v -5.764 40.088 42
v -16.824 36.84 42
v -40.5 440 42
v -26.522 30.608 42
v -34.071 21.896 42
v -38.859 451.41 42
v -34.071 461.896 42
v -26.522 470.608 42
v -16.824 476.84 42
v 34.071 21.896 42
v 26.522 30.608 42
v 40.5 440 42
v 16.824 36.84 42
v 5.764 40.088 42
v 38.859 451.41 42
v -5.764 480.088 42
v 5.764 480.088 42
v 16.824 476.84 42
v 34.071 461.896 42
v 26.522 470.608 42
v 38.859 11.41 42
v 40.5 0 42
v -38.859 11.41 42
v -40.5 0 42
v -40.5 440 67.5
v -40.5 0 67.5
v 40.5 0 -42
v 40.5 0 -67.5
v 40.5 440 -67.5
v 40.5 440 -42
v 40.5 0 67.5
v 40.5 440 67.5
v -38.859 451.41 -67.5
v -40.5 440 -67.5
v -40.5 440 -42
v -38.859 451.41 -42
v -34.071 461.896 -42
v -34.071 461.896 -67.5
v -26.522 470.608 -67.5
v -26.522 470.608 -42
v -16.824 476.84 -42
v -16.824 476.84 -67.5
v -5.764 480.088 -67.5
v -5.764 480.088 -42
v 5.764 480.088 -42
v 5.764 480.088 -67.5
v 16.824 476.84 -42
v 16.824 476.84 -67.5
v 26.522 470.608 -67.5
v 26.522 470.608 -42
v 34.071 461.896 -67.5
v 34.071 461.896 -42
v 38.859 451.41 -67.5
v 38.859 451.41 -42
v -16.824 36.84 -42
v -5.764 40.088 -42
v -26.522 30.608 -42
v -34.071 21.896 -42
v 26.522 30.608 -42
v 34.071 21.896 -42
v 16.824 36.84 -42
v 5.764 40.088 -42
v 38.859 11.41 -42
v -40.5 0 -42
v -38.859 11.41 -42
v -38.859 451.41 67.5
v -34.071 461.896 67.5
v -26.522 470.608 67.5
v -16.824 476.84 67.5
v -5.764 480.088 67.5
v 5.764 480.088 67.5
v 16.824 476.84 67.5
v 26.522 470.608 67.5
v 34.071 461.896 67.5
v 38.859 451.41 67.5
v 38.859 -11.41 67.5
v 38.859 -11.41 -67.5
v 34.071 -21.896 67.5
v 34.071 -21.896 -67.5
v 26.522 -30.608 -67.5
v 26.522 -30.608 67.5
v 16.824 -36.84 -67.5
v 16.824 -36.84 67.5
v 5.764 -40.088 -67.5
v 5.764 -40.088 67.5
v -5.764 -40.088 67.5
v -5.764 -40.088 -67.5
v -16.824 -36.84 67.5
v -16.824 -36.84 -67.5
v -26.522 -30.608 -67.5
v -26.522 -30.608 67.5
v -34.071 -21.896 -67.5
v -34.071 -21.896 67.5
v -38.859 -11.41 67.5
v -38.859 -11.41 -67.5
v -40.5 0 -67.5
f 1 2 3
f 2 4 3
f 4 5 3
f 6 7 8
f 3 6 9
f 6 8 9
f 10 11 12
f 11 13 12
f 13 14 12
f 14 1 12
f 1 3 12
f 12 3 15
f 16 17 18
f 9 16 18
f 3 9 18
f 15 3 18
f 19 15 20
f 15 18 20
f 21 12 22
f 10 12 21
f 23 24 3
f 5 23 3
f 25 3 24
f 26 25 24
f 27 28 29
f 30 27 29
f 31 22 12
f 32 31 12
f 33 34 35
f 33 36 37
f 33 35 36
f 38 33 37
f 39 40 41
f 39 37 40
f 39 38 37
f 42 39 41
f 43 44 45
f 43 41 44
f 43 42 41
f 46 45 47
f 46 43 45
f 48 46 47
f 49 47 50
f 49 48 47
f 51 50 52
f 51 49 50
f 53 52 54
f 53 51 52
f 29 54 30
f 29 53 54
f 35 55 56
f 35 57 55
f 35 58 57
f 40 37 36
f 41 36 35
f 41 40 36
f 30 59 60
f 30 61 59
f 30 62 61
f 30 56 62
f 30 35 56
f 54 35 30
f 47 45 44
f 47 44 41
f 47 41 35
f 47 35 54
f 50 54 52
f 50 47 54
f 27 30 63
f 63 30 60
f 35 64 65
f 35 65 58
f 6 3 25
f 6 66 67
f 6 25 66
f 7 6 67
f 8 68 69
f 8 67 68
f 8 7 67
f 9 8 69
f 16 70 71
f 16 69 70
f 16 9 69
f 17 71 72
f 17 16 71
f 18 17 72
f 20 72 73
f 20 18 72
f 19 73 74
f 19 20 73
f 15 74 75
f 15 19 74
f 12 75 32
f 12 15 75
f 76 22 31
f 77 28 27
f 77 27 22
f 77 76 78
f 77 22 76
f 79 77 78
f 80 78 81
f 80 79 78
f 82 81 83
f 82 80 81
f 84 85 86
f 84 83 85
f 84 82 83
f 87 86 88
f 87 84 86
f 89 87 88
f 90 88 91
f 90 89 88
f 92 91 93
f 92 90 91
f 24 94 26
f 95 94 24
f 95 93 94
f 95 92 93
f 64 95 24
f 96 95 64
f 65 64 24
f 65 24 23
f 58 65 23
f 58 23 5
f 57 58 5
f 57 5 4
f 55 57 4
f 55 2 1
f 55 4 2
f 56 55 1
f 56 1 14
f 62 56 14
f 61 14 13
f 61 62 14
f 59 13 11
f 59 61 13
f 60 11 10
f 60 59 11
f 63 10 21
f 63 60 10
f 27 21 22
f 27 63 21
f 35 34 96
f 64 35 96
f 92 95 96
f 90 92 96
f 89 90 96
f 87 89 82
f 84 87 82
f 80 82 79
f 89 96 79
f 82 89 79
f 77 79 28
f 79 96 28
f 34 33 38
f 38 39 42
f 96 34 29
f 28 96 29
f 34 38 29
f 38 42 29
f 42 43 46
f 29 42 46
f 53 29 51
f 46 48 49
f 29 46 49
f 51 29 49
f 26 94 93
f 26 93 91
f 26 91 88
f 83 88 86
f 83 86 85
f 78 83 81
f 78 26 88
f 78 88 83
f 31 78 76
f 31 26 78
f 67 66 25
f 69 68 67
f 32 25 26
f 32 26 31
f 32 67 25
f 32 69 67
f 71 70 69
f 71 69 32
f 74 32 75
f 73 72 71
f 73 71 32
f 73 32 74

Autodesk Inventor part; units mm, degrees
ref_plane "YZ Plane" through (0, 0, 0) normal (1, 0, 0) x (0, 1, 0)
ref_plane "XZ Plane" through (0, 0, 0) normal (0, 1, 0) x (-1, 0, 0)
ref_plane "XY Plane" through (0, 0, 0) normal (0, 0, 1) x (1, 0, 0)
sketch "スケッチ1" plane through (0, 0, 0) normal (0, 0, 1) x (1, 0, 0)
  circle A0 centre (0, 0) radius 40.5
  circle A1 centre (0, 440) radius 40.5
  line L0 (-40.5, 440) -> (-40.5, 0)
  line L1 (40.5, 0) -> (40.5, 440)
  dimension "d0" = 81
  dimension "d1" = 81
  dimension "d2" = 440
extrude "押し出し1" add sketch "スケッチ1" along normal mid plane 135
sketch "スケッチ2" plane through (0, 0, 0) normal (0, 0, 1) x (1, 0, 0)
  arc A0 (-40.5, 0) -> (40.5, 0) centre (0, 0) ccw projected
  line L0 (-40.5, 0) -> (-40.5, 440) projected
  arc A1 (40.5, 440) -> (-40.5, 440) centre (0, 440) ccw projected
  line L1 (40.5, 440) -> (40.5, 0) projected
  arc A2 (-40.5, 0) -> (40.5, 0) centre (0, 0) ccw projected
  line L2 (-40.5, 0) -> (-40.5, 440) projected
  arc A3 (40.5, 440) -> (-40.5, 440) centre (0, 440) ccw projected
  line L3 (40.5, 440) -> (40.5, 0) projected
extrude "押し出し2" cut sketch "スケッチ2" along normal mid plane 84
sketch "スケッチ3" plane through (0, 0, -42) normal (0, 0, 1) x (1, 0, 0)
  circle A0 centre (0, 0) radius 40.5
  point P0 (40.5, 0)
extrude "押し出し3" add sketch "スケッチ3" along normal up to surface (84 mm away)
properties part number "link2"
